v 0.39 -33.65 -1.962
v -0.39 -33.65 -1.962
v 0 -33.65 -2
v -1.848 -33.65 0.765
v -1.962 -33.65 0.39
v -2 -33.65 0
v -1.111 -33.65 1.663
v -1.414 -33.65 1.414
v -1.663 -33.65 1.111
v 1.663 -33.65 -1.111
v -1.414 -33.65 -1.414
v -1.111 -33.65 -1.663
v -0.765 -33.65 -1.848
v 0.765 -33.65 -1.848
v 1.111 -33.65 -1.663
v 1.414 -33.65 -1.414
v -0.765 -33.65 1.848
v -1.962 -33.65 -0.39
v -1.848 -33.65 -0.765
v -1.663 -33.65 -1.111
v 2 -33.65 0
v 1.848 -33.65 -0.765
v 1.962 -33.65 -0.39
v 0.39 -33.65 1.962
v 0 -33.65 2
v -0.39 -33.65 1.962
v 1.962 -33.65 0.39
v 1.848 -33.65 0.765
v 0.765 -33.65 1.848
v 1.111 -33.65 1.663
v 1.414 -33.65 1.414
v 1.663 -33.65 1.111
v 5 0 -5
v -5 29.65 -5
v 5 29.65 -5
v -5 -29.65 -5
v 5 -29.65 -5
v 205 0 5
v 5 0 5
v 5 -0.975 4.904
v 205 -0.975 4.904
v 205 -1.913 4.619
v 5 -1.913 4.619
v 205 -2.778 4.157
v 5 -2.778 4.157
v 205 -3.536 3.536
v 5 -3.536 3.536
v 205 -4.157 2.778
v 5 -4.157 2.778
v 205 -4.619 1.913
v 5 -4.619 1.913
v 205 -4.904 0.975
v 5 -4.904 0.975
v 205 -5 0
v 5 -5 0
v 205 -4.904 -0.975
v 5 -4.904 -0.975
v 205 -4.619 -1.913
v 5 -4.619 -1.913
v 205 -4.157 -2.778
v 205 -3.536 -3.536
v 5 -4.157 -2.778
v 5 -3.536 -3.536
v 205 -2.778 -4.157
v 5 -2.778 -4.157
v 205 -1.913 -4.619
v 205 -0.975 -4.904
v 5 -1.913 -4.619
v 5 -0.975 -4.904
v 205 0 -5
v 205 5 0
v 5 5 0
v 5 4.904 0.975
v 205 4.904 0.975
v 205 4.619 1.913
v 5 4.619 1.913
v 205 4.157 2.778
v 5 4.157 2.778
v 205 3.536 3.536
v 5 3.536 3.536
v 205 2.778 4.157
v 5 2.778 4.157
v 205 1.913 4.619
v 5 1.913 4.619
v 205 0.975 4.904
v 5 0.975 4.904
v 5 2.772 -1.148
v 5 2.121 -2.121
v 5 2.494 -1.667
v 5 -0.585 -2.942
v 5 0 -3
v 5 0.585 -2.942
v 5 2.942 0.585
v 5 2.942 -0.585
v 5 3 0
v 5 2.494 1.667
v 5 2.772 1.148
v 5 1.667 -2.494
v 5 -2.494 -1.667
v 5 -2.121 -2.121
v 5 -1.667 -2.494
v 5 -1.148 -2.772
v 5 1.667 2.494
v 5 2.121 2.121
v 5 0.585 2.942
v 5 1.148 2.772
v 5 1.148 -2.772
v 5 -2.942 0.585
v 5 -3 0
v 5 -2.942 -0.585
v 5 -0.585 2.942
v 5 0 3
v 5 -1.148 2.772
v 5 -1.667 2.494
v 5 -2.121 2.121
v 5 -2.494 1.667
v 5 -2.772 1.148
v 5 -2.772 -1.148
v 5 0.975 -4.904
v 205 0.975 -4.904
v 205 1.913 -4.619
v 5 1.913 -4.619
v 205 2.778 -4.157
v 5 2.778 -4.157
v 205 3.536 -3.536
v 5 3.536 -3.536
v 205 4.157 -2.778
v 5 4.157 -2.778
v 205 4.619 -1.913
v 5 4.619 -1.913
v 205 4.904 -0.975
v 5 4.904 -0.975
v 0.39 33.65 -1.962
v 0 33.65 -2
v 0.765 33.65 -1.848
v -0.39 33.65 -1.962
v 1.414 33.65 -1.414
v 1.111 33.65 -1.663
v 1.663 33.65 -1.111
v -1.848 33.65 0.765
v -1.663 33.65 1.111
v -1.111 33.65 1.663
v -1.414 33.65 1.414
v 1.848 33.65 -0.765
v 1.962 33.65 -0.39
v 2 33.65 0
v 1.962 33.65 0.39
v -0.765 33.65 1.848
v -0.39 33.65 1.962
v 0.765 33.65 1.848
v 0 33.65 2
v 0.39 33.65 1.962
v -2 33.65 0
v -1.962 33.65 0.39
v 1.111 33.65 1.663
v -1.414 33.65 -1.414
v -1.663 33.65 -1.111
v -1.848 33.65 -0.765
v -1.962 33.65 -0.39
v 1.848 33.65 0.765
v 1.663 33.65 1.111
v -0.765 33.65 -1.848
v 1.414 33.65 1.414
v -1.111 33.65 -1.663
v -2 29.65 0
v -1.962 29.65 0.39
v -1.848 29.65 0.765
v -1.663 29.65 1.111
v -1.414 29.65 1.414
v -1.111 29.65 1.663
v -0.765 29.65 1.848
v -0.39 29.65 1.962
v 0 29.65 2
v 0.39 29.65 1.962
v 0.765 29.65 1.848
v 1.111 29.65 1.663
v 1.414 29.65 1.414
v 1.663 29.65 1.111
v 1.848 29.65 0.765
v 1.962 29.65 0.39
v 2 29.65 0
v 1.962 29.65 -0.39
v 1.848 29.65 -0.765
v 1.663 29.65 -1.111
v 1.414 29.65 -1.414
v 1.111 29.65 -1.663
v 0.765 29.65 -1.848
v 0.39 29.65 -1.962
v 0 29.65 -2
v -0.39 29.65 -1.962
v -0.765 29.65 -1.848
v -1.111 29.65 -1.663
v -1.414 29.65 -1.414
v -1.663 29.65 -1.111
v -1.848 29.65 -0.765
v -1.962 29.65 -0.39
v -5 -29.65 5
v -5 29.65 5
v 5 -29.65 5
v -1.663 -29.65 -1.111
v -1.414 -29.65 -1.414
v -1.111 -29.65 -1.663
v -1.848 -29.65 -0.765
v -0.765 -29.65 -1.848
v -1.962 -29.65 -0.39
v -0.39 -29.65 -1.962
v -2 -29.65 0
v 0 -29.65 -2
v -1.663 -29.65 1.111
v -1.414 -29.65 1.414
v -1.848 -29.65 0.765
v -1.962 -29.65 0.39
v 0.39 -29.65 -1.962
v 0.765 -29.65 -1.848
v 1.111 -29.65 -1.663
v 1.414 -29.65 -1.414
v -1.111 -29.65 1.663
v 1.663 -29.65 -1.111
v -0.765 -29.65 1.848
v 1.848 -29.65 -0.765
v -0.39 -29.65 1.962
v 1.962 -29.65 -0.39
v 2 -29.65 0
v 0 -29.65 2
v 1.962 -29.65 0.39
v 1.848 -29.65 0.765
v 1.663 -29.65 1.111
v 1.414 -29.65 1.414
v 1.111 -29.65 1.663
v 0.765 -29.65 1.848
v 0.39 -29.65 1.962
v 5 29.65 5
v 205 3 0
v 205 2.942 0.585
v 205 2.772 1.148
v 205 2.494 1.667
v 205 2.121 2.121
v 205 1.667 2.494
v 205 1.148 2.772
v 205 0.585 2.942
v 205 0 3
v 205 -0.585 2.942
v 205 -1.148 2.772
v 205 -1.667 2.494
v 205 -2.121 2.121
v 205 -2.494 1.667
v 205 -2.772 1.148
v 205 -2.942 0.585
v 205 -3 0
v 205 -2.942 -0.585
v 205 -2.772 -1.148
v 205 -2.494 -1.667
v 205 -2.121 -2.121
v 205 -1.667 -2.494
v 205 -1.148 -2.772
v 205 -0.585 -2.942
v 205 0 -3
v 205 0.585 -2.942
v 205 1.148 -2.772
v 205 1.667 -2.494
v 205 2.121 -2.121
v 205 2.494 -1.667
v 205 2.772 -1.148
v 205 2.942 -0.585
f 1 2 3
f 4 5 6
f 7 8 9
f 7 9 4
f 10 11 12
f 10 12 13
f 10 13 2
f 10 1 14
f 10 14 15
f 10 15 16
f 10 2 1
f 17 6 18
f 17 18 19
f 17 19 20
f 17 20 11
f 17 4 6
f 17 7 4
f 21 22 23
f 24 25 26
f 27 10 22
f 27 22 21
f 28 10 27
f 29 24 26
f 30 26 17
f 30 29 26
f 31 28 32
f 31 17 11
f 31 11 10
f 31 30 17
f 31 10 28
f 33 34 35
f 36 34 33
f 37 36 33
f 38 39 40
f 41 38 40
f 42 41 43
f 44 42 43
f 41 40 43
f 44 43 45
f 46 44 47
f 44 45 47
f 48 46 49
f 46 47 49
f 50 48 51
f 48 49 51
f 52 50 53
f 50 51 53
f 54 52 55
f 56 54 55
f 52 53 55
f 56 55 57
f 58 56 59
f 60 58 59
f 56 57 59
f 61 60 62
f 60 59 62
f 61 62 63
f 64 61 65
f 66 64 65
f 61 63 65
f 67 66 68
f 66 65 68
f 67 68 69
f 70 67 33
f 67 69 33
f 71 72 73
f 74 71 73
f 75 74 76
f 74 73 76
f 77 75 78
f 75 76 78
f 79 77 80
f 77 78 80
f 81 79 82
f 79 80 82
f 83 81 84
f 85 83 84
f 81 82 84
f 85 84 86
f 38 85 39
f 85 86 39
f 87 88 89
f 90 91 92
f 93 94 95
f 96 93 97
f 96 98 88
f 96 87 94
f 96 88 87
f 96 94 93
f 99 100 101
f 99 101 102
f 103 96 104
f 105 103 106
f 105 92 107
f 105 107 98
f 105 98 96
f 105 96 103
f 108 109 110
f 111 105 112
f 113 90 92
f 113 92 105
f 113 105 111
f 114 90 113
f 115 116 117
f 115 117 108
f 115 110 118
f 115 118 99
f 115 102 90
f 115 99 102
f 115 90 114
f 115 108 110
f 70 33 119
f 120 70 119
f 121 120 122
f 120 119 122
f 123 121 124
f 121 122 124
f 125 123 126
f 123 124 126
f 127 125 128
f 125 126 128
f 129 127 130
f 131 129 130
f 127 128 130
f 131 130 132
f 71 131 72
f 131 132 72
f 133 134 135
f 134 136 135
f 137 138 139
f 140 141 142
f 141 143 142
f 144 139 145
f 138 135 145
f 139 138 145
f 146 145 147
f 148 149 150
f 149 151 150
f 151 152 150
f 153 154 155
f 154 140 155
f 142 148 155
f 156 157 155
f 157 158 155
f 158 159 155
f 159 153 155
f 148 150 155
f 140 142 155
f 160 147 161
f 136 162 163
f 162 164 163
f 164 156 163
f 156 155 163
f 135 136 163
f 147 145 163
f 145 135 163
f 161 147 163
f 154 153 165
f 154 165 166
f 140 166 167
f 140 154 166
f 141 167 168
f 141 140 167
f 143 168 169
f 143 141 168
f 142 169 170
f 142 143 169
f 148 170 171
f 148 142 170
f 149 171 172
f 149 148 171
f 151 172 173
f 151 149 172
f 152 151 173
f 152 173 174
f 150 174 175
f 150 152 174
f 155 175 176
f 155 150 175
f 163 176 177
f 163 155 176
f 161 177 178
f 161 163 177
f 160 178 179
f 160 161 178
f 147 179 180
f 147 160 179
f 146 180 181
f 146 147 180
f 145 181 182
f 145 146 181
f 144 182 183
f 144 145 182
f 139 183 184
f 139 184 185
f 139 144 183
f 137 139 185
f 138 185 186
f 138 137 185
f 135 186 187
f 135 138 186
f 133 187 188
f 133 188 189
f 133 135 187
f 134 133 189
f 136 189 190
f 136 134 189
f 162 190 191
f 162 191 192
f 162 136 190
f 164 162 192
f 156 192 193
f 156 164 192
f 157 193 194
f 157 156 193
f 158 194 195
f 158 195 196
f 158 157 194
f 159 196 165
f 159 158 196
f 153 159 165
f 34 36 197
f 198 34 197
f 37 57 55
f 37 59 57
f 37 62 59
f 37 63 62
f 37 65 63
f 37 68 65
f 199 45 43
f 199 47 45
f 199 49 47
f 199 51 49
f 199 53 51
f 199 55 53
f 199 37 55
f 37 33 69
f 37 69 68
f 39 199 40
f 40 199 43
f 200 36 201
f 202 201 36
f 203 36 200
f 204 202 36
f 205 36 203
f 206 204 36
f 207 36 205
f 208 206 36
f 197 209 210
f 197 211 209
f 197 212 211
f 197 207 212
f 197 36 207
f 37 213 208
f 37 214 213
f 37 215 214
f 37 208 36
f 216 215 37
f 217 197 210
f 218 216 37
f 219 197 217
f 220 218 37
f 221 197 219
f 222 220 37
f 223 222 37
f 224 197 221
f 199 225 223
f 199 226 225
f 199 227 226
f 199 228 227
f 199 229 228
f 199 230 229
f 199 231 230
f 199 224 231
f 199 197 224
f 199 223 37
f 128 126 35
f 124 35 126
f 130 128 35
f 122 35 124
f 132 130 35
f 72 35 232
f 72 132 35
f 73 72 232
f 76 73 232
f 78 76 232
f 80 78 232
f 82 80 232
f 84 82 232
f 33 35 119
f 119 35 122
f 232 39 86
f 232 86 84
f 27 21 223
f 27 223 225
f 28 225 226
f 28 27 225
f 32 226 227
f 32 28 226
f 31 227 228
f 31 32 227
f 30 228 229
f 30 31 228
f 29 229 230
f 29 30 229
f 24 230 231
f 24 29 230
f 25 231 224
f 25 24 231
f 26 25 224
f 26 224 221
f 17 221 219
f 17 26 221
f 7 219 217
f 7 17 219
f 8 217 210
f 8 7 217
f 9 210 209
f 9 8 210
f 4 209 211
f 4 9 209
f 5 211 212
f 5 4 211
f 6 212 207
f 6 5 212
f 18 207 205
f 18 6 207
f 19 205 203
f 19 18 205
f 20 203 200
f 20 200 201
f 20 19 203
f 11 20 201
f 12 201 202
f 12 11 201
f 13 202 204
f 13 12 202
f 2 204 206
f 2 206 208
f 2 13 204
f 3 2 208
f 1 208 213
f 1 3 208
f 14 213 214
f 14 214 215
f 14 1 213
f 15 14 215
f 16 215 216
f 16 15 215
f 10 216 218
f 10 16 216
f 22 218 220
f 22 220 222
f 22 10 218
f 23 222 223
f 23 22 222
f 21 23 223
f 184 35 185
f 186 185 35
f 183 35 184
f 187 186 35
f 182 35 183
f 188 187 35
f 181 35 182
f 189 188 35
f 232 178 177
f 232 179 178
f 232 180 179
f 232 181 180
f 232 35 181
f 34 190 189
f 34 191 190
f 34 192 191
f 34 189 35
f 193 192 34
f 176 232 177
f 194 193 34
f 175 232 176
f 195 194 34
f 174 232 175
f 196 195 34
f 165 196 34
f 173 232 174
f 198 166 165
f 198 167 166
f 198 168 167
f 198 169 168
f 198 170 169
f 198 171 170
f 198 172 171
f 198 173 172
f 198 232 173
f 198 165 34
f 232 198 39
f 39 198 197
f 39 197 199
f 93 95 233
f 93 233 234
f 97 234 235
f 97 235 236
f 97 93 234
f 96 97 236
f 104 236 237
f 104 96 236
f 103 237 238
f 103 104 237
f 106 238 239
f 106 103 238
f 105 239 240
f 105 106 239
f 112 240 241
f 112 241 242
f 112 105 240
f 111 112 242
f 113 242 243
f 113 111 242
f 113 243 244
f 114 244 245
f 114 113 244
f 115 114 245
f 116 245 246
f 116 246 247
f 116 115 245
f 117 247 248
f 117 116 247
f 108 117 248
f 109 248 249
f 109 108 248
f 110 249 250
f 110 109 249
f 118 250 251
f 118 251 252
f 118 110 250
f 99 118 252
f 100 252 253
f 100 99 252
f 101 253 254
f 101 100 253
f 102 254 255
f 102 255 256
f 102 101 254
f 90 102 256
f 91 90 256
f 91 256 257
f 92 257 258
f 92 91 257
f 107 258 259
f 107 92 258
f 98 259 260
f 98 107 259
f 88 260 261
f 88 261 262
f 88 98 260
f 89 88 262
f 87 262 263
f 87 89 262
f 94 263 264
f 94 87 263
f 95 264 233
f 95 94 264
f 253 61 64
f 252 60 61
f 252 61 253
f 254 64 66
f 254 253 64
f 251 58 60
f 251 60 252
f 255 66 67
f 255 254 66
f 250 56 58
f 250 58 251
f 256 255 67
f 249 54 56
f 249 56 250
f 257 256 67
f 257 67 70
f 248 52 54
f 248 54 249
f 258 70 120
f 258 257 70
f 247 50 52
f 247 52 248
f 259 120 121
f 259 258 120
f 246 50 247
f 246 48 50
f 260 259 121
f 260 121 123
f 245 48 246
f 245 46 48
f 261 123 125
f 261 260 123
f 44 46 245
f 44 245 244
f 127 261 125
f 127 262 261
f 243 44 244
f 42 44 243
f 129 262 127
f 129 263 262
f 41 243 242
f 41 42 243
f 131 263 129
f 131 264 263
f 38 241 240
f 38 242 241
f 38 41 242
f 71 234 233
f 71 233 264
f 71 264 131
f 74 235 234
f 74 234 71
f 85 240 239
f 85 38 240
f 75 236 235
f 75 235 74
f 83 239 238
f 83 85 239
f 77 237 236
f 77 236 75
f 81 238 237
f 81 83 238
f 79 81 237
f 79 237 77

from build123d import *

# Parameters (mm, degrees)
F0_W     = 10
F0_H     = 10
F1_DEPTH = 33.65
F2_W     = 10
F2_H     = 10
F2_R     = 2
F3_DEPTH = 4
F4_W     = 10
F4_H     = 10
F4_R     = 2
F5_DEPTH = 4
F6_R     = 3
F7_DEPTH = 200


with BuildPart() as f1:
    # F0 (on Front) → F1 (new body, symmetric)
    with BuildSketch(Plane.XZ):
        Rectangle(F0_W, F0_H)
    extrude(amount=F1_DEPTH, both=True)

    # F2 (on face) → F3 (cut)
    with BuildSketch(Plane.XZ.offset(33.65)):
        Rectangle(F2_W, F2_H)
        Circle(F2_R, mode=Mode.SUBTRACT)
    extrude(amount=-F3_DEPTH, mode=Mode.SUBTRACT)

    # F4 (on face) → F5 (cut)
    with BuildSketch(Plane(origin=(0, 33.65, 0), x_dir=(-1, 0, 0), z_dir=(0, 1, 0))):
        Rectangle(F4_W, F4_H)
        Circle(F4_R, mode=Mode.SUBTRACT)
    extrude(amount=-F5_DEPTH, mode=Mode.SUBTRACT)

    # F6 (on face) → F7 (join)
    with BuildSketch(Plane.YZ.offset(5)):
        with BuildLine():
            ThreePointArc((0, -5), (3.535534, -3.535534), (5, 0))
            ThreePointArc((5, 0), (3.535534, 3.535534), (0, 5))
            ThreePointArc((0, 5), (-5, 0), (0, -5))
        make_face()
        Circle(F6_R, mode=Mode.SUBTRACT)
    extrude(amount=F7_DEPTH)


solid = f1.part
